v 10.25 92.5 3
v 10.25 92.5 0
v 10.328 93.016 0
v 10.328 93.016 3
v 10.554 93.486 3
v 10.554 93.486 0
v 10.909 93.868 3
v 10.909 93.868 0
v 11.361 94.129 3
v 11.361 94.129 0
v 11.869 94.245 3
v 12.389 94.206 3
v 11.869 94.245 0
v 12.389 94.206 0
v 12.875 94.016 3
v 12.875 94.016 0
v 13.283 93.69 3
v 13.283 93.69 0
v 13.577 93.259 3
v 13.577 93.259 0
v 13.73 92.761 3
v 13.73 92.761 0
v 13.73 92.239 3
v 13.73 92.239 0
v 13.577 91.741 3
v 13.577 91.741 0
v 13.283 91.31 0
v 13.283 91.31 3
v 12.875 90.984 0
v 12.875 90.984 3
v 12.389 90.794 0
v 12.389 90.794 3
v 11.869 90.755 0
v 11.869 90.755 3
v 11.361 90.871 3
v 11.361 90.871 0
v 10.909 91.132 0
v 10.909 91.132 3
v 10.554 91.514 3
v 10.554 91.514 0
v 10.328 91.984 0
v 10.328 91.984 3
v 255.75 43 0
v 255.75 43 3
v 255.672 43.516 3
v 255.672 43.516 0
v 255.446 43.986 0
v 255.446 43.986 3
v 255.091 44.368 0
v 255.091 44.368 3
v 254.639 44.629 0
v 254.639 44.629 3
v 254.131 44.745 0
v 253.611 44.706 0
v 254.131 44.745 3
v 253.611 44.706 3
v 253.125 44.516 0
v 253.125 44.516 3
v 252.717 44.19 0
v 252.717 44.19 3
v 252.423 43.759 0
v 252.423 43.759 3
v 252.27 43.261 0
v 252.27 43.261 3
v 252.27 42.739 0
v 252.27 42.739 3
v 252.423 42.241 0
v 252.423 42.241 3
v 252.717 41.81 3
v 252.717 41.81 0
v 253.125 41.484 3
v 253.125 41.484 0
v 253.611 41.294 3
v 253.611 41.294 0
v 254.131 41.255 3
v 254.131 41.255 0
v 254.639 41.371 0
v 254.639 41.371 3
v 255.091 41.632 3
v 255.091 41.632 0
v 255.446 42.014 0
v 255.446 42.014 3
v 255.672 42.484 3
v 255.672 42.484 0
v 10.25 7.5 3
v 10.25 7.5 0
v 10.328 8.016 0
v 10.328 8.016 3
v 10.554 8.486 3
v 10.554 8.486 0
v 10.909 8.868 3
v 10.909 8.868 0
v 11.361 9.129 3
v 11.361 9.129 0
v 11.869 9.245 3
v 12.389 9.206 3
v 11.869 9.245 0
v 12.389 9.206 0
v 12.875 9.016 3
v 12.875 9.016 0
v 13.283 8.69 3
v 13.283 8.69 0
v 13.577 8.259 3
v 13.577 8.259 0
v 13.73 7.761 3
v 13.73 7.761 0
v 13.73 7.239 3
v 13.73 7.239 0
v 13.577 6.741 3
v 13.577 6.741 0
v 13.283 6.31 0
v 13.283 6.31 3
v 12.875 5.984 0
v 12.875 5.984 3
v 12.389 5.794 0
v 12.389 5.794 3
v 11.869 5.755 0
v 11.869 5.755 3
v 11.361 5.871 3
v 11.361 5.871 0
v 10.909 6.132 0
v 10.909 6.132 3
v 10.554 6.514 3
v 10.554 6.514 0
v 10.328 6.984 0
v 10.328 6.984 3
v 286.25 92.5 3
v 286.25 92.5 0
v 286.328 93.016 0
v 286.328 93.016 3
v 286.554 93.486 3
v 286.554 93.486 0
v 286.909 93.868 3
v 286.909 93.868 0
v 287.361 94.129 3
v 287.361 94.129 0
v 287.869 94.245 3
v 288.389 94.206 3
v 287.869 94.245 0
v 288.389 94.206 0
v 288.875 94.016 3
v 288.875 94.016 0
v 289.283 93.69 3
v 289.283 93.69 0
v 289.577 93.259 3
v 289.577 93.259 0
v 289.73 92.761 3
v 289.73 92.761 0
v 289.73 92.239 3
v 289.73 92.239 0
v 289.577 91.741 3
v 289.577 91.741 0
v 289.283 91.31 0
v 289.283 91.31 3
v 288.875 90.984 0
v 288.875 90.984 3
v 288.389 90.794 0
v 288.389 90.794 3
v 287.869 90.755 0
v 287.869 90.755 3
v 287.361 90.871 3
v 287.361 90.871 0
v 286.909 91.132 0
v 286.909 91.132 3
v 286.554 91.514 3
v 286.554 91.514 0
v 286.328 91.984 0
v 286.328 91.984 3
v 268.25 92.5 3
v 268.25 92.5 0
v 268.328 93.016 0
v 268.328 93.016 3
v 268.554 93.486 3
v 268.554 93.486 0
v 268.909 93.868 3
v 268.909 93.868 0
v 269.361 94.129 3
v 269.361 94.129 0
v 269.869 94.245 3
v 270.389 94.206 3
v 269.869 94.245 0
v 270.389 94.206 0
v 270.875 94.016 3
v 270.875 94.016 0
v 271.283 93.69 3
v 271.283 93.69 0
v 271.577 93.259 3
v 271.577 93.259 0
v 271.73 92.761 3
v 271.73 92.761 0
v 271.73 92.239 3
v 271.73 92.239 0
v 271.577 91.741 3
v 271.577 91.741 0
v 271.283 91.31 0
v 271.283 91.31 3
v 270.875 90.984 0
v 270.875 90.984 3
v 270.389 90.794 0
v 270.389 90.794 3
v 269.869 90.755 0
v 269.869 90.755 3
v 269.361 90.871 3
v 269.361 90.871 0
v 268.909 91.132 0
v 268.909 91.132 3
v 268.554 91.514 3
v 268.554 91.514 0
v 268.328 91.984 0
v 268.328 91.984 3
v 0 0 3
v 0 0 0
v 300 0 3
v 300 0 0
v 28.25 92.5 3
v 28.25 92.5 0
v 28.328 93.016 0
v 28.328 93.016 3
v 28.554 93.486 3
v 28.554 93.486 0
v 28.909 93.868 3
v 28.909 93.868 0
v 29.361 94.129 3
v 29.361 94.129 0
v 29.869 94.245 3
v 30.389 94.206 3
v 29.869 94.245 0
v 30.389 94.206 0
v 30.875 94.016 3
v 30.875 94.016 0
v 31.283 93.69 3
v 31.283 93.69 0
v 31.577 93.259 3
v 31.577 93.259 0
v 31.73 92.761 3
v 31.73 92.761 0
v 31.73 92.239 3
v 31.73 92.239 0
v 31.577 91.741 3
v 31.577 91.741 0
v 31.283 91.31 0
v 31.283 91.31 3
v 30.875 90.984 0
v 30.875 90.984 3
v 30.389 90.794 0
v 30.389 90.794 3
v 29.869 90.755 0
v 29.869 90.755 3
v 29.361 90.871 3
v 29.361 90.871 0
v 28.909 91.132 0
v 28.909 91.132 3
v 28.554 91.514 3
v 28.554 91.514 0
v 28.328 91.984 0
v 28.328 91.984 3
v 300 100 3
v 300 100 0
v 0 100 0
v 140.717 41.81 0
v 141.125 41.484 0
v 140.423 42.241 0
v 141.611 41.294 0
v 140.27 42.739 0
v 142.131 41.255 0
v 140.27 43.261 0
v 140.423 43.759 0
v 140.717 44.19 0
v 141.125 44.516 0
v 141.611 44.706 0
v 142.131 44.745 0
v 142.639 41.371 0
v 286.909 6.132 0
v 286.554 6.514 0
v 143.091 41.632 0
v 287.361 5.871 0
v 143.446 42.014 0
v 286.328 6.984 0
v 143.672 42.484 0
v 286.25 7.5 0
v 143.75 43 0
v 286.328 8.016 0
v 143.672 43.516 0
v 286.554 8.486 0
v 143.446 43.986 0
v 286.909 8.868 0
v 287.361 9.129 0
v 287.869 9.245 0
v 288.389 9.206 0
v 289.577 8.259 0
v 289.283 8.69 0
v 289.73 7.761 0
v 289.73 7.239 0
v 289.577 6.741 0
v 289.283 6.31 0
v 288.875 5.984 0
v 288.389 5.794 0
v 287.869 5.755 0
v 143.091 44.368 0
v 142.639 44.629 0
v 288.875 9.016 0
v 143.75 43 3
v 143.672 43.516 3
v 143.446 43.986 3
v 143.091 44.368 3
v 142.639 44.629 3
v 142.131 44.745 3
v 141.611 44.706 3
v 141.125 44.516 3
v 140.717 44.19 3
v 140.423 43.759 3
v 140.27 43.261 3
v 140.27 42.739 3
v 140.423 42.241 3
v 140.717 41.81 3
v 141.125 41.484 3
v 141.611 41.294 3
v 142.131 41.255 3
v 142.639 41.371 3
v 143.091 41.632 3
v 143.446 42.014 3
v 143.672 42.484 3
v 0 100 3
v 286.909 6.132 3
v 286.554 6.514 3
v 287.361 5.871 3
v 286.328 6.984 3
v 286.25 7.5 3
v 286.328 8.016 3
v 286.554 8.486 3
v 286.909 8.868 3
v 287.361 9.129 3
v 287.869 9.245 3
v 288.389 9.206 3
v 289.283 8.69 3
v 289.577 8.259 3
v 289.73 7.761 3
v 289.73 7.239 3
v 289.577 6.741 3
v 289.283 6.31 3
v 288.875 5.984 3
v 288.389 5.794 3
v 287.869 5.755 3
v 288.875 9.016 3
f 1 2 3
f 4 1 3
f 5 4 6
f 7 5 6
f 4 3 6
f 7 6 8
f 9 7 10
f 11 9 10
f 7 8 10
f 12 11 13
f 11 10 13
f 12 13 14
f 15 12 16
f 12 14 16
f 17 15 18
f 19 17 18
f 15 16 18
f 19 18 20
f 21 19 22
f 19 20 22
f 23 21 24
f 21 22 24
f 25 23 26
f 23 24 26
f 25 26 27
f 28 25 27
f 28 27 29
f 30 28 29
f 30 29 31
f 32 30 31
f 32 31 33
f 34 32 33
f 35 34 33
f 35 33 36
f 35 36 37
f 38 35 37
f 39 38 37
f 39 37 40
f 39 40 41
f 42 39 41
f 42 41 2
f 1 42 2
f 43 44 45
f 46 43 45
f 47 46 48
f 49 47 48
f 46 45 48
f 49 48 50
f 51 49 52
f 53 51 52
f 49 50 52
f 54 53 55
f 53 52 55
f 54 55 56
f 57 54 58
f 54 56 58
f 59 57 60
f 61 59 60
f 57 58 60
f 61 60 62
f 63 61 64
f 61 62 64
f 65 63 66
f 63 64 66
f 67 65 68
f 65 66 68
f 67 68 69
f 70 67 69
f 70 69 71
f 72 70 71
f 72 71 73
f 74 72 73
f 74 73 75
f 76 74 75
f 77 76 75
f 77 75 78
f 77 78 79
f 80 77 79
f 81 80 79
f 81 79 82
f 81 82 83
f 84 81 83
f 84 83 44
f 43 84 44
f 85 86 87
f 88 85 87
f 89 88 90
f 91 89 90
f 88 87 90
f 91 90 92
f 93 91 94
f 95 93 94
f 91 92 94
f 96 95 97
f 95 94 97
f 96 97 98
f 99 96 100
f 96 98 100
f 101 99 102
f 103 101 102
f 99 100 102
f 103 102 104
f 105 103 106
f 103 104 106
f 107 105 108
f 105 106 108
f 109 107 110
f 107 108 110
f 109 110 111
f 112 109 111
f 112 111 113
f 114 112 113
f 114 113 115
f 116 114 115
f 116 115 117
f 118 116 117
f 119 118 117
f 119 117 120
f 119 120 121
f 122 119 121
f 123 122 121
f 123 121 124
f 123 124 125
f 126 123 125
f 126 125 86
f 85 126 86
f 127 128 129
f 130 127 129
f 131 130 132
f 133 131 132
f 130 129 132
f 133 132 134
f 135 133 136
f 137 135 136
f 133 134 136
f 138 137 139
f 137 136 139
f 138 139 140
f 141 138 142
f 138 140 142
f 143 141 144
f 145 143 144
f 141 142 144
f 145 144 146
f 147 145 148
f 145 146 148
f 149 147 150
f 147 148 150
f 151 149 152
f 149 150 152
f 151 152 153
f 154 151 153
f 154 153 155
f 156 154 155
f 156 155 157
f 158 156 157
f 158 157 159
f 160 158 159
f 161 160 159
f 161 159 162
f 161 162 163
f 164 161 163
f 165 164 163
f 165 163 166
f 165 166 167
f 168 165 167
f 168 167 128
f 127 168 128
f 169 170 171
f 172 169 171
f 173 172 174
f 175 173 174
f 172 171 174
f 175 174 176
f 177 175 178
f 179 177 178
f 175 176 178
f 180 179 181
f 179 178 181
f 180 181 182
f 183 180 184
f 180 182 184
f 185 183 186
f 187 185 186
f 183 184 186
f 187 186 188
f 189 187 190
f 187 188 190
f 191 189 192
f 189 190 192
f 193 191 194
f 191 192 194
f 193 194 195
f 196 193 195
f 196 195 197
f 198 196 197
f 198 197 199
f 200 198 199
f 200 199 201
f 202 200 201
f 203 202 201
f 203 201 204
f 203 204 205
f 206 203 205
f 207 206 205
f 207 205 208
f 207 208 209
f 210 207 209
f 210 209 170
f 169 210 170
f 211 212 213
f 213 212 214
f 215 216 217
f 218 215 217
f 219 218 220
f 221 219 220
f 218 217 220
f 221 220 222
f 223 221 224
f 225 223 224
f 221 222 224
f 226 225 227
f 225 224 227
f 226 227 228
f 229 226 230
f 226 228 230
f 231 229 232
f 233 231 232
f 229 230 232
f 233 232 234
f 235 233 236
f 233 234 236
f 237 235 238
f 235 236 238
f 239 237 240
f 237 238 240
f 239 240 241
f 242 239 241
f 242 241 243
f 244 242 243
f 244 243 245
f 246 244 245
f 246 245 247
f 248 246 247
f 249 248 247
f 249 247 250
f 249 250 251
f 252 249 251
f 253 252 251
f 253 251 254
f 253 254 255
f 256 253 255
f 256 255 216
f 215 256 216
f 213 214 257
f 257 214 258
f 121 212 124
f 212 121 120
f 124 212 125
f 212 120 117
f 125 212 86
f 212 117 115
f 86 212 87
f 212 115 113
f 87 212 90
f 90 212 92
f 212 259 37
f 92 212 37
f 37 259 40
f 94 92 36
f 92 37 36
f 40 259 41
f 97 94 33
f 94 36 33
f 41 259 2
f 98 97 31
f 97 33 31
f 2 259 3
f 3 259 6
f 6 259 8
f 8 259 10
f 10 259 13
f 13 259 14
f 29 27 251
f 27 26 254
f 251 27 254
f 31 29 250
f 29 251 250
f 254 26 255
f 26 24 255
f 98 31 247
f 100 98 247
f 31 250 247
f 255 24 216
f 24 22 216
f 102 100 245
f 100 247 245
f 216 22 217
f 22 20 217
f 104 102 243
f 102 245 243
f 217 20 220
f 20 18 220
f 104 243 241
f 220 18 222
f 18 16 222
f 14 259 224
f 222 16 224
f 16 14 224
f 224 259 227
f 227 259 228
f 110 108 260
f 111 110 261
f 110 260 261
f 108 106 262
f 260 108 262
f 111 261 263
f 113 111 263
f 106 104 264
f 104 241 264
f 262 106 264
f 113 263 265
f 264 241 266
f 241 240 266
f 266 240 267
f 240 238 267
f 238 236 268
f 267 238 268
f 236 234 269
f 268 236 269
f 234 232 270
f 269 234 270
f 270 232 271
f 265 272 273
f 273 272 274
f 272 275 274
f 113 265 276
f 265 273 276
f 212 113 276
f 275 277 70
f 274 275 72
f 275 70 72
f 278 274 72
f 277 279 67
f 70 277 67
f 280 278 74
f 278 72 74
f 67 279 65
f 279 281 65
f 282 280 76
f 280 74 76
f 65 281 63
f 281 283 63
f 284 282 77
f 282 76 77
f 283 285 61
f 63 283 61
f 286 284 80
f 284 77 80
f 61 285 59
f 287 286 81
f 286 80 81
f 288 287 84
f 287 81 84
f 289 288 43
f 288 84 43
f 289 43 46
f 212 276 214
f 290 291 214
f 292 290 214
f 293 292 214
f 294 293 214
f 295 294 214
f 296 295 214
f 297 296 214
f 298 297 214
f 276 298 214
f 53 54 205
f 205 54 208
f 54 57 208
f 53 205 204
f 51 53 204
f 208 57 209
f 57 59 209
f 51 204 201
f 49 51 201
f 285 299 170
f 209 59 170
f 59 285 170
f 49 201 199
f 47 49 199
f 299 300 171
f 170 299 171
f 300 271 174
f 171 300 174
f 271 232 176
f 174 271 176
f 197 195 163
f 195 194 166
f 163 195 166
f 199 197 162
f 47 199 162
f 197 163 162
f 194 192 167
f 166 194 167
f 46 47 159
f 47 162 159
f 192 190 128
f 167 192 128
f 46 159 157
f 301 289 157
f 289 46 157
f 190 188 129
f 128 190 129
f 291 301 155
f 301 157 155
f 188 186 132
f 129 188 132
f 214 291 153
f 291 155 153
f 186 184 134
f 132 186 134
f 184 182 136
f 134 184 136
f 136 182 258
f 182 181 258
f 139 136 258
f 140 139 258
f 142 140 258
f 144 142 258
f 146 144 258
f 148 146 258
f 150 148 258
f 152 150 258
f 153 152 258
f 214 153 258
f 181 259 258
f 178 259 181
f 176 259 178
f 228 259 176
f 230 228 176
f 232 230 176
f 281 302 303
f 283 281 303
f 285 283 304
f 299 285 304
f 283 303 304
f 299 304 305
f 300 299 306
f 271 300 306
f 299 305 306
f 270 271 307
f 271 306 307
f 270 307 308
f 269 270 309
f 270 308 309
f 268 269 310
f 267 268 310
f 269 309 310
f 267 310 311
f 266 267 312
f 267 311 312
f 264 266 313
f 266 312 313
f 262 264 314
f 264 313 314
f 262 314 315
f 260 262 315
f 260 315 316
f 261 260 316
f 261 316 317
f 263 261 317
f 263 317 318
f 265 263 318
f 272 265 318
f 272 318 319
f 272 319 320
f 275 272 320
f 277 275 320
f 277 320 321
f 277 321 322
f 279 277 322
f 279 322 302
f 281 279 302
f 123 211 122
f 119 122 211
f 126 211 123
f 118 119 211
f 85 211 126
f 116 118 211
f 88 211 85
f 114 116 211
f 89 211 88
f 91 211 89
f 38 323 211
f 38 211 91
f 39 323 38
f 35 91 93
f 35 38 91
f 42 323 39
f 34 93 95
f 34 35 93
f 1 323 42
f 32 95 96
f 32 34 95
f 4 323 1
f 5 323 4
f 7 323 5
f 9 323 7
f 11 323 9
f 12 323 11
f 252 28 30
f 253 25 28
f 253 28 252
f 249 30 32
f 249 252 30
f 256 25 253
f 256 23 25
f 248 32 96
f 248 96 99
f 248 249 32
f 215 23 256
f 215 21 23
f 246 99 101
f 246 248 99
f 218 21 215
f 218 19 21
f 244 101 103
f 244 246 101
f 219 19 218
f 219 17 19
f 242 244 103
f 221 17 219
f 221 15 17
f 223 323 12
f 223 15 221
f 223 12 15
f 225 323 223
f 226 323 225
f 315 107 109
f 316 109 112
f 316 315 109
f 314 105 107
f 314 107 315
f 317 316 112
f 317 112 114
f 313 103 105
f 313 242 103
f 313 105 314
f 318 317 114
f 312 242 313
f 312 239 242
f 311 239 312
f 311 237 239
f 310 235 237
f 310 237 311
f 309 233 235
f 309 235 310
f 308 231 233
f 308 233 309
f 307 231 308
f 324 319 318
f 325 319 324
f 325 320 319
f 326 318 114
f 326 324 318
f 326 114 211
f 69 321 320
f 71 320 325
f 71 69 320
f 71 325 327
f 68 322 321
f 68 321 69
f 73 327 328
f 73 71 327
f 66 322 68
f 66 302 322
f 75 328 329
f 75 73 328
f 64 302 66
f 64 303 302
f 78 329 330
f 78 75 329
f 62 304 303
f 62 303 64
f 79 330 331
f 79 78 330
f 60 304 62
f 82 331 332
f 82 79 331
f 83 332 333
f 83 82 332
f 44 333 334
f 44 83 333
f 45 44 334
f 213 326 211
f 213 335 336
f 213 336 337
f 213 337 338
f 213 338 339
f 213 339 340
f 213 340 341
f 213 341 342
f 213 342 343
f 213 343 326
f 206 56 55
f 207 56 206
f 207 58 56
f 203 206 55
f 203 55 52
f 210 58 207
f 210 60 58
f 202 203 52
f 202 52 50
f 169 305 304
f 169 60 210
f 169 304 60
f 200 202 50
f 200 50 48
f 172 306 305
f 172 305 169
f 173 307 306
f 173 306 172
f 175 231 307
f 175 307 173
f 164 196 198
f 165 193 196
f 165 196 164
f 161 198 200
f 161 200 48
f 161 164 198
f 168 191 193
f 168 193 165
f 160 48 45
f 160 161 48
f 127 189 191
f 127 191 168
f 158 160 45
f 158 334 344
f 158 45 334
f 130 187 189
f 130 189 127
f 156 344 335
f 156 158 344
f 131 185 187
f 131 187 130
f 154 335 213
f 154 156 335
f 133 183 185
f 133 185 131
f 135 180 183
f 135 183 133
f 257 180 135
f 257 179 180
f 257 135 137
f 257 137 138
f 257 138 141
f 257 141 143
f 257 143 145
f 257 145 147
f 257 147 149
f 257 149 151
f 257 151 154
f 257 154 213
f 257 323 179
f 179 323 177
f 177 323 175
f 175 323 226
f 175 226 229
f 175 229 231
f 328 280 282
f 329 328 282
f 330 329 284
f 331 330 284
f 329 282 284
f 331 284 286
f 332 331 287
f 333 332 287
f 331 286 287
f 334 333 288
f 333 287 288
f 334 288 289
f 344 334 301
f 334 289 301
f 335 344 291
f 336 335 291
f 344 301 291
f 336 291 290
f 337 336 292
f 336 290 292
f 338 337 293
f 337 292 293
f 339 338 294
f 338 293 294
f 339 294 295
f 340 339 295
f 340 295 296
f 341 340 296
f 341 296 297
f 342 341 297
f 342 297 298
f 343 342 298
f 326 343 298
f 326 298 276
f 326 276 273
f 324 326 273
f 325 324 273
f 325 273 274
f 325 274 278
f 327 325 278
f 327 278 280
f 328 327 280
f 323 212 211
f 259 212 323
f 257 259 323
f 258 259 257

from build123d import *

# Parameters (mm, degrees)
SKETCH1_W           = 300
SKETCH1_H           = 100
BOSS_EXTRUDE1_DEPTH = 3
SKETCH6_R           = 1.75
CUT_EXTRUDE5_DEPTH  = 30
SKETCH7_R           = 1.75
CUT_EXTRUDE6_DEPTH  = 10


with BuildPart() as part:
    # Sketch1 → Boss-Extrude1 (new body)
    with BuildSketch(Plane.XY):
        with Locations((150, 50)):
            Rectangle(SKETCH1_W, SKETCH1_H)
    extrude(amount=BOSS_EXTRUDE1_DEPTH)

    # Sketch6 → Cut-Extrude5 (cut)
    with BuildSketch(Plane.XY.offset(3)):
        with Locations((142, 43)):
            Circle(SKETCH6_R)
        with Locations((254, 43)):
            Circle(SKETCH6_R)
    extrude(amount=-CUT_EXTRUDE5_DEPTH, mode=Mode.SUBTRACT)

    # Sketch7 → Cut-Extrude6 (cut)
    with BuildSketch(Plane(origin=(0, 0, 0), x_dir=(-1, 0, 0), z_dir=(0, 0, -1))):
        with Locations((-288, 92.5)):
            Circle(SKETCH7_R)
        with Locations((-270, 92.5)):
            Circle(SKETCH7_R)
        with Locations((-288, 7.5)):
            Circle(SKETCH7_R)
        with Locations((-12, 7.5)):
            Circle(SKETCH7_R)
        with Locations((-12, 92.5)):
            Circle(SKETCH7_R)
        with Locations((-30, 92.5)):
            Circle(SKETCH7_R)
    extrude(amount=-CUT_EXTRUDE6_DEPTH, mode=Mode.SUBTRACT)


solid = part.part
